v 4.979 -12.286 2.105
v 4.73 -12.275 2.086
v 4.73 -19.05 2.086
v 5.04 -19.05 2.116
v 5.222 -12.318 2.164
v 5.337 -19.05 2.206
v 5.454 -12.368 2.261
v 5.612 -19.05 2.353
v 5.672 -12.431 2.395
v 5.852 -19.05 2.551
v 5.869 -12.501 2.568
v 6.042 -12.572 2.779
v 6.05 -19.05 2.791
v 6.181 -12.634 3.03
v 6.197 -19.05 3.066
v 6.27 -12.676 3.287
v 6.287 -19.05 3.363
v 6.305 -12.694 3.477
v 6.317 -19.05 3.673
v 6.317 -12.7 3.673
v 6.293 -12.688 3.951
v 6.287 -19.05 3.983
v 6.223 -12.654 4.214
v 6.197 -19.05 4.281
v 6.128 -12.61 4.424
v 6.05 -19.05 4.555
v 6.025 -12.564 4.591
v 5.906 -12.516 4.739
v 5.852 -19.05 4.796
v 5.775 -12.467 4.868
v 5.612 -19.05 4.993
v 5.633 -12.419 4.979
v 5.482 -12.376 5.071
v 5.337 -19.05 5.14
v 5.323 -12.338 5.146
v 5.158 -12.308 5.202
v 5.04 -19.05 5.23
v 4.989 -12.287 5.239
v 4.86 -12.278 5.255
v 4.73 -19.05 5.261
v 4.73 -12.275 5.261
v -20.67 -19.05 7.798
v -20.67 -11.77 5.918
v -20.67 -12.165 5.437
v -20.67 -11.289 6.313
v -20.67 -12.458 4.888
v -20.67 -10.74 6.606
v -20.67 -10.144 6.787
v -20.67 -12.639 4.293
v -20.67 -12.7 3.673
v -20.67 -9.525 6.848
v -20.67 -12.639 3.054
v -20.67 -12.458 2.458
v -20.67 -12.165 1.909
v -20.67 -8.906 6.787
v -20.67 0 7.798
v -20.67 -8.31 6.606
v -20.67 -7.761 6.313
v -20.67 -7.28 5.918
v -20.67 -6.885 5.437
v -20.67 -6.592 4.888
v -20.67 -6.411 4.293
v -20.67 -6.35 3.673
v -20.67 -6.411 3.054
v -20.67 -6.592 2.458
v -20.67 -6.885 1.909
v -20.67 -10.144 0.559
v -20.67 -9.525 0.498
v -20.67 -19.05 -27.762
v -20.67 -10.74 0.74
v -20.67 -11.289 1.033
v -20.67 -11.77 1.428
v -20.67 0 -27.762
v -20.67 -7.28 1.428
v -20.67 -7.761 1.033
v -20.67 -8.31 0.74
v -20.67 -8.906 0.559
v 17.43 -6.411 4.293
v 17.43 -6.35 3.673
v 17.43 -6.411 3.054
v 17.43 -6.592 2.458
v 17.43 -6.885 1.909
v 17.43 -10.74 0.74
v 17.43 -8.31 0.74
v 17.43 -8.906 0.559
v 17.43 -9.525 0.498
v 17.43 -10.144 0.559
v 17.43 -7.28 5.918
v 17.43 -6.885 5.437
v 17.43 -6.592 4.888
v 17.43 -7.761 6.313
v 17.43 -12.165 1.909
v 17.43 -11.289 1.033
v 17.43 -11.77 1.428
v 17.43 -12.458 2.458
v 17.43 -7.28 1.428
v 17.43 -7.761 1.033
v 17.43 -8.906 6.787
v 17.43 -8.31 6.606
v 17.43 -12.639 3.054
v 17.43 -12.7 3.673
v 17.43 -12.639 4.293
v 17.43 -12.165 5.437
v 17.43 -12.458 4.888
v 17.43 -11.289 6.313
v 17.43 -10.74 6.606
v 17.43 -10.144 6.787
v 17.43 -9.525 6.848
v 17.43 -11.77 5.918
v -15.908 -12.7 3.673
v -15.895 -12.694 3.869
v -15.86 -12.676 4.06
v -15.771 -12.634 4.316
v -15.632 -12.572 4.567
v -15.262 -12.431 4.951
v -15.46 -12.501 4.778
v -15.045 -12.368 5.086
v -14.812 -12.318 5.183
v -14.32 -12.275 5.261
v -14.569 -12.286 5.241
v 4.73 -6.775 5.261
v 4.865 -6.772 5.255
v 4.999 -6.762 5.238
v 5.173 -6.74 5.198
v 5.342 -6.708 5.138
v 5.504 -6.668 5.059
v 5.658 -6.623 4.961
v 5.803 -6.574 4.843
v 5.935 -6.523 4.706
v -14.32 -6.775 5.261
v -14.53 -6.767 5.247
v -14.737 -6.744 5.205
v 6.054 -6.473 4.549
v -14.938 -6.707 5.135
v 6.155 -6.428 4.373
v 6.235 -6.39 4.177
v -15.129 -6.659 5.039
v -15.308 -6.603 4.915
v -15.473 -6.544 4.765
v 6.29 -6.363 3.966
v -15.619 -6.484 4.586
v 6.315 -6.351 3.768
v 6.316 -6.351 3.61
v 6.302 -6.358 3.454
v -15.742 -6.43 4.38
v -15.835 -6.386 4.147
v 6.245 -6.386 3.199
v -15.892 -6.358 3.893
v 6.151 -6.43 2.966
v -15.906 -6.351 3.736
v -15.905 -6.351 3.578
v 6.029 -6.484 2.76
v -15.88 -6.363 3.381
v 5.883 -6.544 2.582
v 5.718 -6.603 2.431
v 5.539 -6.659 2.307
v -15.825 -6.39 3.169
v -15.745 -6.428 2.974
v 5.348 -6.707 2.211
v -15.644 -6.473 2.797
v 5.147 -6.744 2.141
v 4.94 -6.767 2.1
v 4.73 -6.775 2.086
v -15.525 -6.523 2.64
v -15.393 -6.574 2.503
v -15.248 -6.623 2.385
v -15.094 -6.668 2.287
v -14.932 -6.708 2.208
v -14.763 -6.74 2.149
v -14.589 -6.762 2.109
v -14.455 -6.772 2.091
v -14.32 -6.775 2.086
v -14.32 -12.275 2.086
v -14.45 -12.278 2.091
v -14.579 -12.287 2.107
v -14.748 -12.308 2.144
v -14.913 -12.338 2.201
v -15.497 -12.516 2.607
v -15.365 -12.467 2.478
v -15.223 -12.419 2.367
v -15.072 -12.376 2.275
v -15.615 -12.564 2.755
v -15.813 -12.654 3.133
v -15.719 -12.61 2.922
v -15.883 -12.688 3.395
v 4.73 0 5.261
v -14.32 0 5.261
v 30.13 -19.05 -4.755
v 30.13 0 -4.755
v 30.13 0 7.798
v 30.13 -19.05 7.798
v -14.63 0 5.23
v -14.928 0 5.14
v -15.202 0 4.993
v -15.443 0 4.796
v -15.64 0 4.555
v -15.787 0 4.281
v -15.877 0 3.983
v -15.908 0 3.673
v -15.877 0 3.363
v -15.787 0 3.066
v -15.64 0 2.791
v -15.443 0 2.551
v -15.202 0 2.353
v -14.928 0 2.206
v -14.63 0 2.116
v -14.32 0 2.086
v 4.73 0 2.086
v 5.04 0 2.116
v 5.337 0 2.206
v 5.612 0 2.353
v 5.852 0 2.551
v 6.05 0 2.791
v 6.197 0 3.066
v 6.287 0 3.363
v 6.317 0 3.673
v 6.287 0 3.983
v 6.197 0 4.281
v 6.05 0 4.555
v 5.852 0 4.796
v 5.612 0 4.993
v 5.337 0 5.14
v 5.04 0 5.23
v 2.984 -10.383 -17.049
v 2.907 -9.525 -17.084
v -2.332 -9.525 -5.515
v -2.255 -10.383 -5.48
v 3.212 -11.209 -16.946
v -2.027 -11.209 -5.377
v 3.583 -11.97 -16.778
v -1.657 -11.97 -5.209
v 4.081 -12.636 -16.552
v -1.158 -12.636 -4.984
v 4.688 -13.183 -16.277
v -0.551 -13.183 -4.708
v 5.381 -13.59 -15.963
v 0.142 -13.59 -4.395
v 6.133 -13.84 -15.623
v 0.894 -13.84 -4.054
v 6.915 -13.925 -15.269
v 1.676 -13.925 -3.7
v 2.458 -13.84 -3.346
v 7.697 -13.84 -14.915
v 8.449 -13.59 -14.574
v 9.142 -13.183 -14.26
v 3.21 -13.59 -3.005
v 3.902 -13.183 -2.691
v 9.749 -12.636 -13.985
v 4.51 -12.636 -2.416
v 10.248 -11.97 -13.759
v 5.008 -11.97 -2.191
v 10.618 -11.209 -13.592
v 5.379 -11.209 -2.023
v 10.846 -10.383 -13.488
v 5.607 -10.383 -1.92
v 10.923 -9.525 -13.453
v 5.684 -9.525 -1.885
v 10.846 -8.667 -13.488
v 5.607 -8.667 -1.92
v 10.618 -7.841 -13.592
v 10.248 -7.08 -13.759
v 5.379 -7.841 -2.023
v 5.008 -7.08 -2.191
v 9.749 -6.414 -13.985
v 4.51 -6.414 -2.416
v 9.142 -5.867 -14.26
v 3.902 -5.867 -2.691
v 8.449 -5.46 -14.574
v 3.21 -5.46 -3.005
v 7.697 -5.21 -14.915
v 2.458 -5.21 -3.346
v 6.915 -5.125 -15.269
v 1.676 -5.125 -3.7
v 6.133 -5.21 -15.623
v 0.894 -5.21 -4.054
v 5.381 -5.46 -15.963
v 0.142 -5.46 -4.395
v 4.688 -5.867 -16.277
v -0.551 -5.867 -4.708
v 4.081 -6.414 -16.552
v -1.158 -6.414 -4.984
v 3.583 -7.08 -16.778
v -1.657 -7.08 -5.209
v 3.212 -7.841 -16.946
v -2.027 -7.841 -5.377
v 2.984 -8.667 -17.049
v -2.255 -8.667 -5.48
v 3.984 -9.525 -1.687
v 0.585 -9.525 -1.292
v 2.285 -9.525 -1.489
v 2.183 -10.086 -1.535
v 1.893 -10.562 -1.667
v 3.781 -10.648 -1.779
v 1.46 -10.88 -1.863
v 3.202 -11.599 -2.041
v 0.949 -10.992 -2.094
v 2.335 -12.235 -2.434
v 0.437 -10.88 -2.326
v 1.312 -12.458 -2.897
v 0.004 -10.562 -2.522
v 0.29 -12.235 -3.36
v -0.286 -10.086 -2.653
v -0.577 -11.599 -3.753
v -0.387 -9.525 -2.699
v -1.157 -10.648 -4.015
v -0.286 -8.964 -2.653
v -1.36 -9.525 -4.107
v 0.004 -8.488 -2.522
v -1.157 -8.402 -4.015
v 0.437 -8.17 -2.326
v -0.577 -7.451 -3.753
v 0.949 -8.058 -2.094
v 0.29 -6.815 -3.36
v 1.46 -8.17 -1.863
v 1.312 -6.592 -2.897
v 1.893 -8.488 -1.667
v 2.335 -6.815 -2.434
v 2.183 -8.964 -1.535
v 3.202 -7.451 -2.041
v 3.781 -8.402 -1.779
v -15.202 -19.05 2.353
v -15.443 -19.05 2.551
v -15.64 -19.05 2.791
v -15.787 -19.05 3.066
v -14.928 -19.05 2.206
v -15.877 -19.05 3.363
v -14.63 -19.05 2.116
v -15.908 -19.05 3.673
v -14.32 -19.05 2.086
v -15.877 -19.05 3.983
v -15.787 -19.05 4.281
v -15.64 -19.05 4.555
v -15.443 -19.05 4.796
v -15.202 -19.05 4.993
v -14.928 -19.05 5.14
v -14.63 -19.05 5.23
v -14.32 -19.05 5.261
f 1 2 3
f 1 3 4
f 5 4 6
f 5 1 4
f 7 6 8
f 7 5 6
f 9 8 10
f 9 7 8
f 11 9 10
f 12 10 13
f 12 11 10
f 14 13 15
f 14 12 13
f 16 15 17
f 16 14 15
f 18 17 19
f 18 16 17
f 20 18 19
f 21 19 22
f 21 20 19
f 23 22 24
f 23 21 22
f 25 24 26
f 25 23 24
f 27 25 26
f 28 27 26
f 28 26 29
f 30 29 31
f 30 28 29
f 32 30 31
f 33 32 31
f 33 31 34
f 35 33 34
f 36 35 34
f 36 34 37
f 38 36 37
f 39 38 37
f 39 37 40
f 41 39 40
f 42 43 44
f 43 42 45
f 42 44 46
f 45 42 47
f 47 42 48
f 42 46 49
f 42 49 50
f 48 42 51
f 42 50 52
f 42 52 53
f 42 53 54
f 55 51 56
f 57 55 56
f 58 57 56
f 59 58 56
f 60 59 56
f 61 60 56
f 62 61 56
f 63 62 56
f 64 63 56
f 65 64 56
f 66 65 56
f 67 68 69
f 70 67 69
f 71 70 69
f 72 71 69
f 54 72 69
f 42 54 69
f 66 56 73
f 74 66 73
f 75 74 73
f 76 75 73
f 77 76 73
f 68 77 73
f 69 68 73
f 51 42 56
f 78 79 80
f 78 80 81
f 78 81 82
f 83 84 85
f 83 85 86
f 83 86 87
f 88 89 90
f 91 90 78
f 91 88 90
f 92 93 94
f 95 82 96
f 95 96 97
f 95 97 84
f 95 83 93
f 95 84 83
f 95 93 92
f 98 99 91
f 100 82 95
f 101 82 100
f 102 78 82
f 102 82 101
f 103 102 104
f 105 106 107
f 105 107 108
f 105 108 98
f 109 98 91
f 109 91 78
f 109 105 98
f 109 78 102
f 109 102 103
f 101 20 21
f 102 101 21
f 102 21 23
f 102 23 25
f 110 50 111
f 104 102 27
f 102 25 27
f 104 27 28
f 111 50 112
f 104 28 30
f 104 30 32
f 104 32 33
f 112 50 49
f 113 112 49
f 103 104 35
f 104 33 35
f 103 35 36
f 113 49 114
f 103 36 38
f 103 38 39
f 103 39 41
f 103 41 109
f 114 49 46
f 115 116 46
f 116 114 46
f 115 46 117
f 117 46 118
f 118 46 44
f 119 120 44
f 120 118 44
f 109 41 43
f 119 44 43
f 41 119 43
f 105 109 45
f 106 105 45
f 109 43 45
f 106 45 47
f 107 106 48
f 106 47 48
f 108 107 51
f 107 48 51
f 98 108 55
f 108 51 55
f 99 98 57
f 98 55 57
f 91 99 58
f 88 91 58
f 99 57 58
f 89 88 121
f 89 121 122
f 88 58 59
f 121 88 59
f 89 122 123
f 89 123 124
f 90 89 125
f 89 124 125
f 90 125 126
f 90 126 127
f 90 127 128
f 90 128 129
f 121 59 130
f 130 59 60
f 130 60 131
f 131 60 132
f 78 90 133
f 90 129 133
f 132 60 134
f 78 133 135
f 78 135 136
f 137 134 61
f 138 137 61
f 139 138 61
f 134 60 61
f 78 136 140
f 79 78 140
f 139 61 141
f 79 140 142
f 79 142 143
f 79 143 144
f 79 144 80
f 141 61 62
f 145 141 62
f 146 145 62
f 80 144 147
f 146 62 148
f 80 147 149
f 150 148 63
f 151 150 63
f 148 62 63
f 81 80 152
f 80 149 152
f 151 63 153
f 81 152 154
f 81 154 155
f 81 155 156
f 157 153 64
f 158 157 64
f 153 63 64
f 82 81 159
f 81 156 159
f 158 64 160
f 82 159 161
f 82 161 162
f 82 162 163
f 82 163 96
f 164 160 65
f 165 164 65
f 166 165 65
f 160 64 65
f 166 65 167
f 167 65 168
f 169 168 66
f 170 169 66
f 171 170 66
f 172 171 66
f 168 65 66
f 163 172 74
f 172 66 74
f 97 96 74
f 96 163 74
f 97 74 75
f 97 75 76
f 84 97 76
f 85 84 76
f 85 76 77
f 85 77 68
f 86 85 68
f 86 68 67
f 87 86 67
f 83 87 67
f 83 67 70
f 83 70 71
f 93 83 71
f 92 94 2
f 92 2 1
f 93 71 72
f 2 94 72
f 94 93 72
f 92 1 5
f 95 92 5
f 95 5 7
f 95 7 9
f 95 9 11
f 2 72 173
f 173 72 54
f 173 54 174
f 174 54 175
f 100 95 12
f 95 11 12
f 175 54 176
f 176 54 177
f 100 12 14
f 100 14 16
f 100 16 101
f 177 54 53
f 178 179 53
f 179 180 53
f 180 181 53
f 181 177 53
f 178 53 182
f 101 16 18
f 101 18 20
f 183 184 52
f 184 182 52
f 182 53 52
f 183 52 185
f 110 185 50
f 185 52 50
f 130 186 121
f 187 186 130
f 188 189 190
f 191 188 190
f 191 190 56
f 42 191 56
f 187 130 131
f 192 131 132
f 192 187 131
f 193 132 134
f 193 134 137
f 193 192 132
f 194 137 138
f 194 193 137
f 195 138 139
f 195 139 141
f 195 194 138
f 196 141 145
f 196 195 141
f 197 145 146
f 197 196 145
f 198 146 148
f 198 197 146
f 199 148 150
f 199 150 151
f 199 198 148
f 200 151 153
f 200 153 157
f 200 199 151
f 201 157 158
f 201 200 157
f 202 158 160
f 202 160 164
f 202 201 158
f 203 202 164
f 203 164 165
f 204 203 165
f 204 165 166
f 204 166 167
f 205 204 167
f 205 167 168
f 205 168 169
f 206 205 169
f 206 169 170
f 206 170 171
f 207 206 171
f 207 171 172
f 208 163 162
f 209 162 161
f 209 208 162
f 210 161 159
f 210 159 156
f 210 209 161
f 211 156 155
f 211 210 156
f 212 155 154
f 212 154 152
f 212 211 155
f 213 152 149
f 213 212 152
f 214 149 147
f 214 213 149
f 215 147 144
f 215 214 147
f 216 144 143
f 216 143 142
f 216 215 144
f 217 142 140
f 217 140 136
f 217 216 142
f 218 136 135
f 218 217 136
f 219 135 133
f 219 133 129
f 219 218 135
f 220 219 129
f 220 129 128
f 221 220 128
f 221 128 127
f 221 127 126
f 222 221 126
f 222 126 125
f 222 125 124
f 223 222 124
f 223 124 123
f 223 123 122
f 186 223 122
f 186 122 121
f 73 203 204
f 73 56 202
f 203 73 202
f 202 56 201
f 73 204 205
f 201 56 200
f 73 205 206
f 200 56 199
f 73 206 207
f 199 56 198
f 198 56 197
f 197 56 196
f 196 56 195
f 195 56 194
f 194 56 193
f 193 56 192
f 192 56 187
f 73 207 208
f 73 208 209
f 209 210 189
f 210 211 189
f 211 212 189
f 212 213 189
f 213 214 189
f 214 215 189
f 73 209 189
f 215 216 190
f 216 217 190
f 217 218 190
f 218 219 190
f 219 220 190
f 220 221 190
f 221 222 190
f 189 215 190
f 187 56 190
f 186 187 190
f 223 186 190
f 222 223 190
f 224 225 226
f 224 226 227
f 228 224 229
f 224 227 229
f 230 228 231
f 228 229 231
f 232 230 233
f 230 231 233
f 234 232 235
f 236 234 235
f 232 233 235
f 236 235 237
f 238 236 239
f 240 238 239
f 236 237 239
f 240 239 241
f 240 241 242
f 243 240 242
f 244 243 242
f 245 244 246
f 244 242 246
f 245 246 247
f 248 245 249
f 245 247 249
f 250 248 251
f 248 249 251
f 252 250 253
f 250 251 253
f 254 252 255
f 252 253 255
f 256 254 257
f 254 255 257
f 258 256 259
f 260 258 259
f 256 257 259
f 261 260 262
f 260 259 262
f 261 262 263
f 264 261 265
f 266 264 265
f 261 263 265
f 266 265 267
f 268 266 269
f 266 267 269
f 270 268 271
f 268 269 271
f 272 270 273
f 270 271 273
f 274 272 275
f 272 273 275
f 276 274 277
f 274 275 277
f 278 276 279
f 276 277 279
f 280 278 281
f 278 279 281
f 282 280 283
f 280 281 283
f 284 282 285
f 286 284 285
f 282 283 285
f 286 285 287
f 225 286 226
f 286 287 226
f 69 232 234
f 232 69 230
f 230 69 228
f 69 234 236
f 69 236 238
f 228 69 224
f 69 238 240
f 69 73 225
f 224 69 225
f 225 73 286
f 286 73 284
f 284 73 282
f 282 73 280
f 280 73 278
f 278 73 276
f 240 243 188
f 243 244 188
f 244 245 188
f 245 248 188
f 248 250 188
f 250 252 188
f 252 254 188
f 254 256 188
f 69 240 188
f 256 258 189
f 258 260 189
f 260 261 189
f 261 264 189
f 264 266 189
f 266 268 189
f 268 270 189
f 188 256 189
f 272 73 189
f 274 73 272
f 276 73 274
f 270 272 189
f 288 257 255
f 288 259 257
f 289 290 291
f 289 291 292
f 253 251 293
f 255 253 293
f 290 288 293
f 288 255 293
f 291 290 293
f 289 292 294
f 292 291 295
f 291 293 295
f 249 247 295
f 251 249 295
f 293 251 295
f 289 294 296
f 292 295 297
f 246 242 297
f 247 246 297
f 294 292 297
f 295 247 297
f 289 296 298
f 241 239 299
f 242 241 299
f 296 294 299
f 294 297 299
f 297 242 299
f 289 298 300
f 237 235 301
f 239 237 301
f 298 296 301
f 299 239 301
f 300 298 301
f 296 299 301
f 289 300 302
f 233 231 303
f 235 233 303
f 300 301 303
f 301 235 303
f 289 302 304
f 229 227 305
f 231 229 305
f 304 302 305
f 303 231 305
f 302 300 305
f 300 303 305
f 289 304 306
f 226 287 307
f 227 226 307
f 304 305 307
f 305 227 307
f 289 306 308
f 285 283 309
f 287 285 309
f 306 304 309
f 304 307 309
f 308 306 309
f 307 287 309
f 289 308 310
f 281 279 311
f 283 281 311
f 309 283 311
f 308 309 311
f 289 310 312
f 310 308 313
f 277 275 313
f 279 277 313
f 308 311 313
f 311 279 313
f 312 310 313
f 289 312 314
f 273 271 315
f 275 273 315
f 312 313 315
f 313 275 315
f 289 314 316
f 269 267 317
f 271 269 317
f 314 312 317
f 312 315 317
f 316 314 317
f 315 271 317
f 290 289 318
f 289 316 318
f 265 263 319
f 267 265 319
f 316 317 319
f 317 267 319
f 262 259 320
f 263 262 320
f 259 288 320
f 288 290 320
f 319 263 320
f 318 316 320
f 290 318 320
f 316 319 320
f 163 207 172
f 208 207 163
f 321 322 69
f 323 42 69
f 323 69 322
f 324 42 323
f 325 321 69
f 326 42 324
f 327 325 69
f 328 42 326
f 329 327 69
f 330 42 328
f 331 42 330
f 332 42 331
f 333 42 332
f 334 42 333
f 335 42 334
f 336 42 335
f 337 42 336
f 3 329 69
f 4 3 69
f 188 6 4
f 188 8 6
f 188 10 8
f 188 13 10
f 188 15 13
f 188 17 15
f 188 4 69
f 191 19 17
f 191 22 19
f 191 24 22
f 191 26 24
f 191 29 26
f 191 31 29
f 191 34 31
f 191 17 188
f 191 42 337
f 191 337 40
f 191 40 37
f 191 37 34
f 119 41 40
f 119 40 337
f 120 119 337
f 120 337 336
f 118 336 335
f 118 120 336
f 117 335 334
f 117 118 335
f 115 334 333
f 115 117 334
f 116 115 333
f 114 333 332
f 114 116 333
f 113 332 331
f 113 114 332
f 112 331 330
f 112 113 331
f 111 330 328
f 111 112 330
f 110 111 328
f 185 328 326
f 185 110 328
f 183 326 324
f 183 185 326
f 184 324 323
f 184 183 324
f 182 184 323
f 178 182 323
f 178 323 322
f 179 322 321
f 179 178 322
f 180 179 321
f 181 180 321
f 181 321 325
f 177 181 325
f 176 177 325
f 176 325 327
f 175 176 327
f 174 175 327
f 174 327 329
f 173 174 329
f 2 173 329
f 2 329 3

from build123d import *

# Parameters (mm, degrees)
F1_DEPTH = 19.05
F3_R     = 3.175
F4_DEPTH = 38.1
F6_DEPTH = 19.05
F8_D     = 8.8
F8_DEPTH = 12.7
F8_TIP   = 2.6437867237


with BuildPart() as f1:
    # F0 (on Front) → F1 (new body)
    with BuildSketch(Plane.XZ):
        Polygon((-20.6700884257, 7.7979226127), (-20.6700884257, -27.7620773873), (30.1299115743, -4.7548310105), (30.1299115743, 7.7979226127), align=None)
    extrude(amount=F1_DEPTH)

    # F3 (on face) → F4 (cut)
    with BuildSketch(Plane(origin=(-20.6700884257, 0, 0), x_dir=(0, -1, 0), z_dir=(-1, 0, 0))):
        with Locations((9.525, 3.6731153582)):
            Circle(F3_R)
    extrude(amount=-F4_DEPTH, mode=Mode.SUBTRACT)

    # F5 (on face) → F6 (cut, through all)
    with BuildSketch(Plane.XZ):
        with BuildLine():
            ThreePointArc((4.7299115743, 2.0856153582), (6.3174115743, 3.6731153582), (4.7299115743, 5.2606153582))
            Line((4.7299115743, 5.2606153582), (-14.3200884257, 5.2606153582))
            ThreePointArc((-14.3200884257, 5.2606153582), (-15.9075884257, 3.6731153582), (-14.3200884257, 2.0856153582))
            Line((-14.3200884257, 2.0856153582), (4.7299115743, 2.0856153582))
        make_face()
    extrude(amount=F6_DEPTH, mode=Mode.SUBTRACT)

    # F8
    with Locations(Plane(origin=(6.9151919719, 0, -15.2687438739), x_dir=(0.9109307781, 0, 0.4125592292), z_dir=(0.4125592292, 0, -0.9109307781))):
        with Locations((0, 9.525)):
            Hole(F8_D / 2, depth=F8_DEPTH)
            with Locations((0, 0, -(F8_DEPTH + F8_TIP / 2))):  # 118° drill point
                Cone(0, F8_D / 2, F8_TIP, mode=Mode.SUBTRACT)


solid = f1.part
